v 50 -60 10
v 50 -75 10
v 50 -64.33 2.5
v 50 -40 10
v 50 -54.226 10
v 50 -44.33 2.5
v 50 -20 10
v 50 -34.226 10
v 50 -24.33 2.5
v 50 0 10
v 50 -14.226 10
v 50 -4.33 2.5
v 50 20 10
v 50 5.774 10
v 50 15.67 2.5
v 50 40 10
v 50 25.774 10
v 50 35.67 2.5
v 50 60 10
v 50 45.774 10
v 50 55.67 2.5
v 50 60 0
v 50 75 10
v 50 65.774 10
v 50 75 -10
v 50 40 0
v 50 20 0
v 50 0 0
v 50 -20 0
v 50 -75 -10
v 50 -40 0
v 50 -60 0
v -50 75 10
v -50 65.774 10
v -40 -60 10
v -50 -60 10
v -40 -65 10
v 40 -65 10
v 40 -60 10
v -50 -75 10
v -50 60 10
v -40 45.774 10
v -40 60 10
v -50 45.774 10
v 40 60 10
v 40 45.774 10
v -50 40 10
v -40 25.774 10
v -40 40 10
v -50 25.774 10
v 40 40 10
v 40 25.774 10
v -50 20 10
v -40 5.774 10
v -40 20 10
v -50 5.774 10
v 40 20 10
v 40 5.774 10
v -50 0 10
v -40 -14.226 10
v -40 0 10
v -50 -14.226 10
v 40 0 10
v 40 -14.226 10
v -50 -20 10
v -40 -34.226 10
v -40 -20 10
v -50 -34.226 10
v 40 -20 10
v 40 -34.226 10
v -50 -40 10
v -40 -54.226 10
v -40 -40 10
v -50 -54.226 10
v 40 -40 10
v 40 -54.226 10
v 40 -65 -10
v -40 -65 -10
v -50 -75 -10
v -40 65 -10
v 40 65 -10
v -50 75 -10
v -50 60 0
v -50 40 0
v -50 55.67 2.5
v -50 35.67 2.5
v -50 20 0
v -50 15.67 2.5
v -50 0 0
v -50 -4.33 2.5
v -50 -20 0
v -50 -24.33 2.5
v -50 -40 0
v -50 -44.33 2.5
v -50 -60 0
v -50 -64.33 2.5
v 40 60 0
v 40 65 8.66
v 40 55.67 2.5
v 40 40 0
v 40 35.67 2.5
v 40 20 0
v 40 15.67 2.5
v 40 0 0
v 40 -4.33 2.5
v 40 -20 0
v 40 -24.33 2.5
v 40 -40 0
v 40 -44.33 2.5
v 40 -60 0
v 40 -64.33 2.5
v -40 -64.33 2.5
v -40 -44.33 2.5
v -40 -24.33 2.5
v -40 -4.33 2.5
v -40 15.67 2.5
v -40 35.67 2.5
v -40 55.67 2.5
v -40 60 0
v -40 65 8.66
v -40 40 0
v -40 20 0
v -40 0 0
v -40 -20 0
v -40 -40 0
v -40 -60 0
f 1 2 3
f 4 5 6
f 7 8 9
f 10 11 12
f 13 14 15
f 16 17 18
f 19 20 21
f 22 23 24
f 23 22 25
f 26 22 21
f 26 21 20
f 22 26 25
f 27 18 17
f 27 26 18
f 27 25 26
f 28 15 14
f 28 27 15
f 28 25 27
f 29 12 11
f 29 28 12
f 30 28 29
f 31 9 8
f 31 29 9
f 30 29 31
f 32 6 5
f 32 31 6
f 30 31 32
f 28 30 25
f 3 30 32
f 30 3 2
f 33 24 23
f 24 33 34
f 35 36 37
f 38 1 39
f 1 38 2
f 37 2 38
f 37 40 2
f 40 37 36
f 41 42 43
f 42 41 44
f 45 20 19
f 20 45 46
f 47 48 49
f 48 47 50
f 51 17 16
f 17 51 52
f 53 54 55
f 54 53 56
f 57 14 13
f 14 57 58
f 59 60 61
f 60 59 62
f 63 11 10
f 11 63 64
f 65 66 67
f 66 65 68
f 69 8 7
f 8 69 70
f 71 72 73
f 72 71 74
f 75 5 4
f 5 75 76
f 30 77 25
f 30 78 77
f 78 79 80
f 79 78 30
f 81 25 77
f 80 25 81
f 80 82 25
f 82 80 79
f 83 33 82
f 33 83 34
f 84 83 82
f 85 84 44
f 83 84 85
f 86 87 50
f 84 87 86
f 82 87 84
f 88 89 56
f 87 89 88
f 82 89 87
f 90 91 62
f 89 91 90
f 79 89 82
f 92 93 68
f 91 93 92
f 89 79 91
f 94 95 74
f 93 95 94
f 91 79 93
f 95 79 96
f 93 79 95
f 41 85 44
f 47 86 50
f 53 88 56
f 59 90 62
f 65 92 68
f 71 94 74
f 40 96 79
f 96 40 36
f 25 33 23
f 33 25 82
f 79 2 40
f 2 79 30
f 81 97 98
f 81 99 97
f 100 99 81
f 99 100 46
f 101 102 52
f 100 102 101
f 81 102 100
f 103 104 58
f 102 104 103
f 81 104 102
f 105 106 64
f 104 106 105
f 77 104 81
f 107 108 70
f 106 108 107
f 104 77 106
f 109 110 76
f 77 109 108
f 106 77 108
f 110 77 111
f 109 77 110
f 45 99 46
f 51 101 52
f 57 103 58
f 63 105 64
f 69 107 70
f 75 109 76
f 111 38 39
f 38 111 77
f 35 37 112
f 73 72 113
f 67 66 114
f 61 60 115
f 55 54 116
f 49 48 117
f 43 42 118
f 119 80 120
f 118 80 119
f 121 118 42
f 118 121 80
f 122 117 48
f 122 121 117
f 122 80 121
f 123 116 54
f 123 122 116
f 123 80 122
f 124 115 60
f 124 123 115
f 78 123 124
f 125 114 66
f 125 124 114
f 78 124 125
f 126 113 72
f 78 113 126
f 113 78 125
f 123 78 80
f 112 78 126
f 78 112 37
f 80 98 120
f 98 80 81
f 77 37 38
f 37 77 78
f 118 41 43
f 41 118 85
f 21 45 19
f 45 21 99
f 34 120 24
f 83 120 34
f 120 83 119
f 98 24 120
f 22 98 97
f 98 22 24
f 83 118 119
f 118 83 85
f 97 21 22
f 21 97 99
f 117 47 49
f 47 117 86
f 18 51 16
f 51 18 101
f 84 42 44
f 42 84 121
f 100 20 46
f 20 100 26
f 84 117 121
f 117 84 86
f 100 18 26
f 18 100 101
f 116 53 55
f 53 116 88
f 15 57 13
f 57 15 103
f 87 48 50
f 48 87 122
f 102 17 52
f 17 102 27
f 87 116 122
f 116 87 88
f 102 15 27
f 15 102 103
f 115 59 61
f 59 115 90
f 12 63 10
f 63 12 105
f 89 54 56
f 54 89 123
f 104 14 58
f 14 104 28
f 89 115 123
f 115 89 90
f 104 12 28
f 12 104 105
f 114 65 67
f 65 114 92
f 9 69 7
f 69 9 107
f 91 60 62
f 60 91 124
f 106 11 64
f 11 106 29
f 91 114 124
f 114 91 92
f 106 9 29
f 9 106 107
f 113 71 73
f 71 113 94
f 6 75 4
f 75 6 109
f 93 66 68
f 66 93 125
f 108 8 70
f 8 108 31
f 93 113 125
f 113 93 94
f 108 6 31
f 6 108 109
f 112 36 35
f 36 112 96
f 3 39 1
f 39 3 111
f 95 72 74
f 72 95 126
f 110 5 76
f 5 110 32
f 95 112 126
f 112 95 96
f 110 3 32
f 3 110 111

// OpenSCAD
larghezza=100; //[50:300]
lunghezza =150; //[50:300]
altezza=20; //[10:50]
spessore=20;//[10:50]
numero_tagli=7;//[1:15]
spessore_tagli=5; //[1:10]
inclinazione=60; //[45:90]
distanza_tagli=20;//[12:50]

difference(){
	difference(){
		cube([larghezza,lunghezza,altezza],true);
		cube([(larghezza-spessore),(lunghezza-spessore),(altezza+1)],true);
	}

	for(i = [-((numero_tagli/2)-1):(numero_tagli/2)])
			translate([(-(larghezza/2)-1),((i*(-distanza_tagli))+(distanza_tagli/2)),(0)])
			rotate([inclinazione,0,0])
			cube([larghezza+2,(lunghezza/2),spessore_tagli]);
}
